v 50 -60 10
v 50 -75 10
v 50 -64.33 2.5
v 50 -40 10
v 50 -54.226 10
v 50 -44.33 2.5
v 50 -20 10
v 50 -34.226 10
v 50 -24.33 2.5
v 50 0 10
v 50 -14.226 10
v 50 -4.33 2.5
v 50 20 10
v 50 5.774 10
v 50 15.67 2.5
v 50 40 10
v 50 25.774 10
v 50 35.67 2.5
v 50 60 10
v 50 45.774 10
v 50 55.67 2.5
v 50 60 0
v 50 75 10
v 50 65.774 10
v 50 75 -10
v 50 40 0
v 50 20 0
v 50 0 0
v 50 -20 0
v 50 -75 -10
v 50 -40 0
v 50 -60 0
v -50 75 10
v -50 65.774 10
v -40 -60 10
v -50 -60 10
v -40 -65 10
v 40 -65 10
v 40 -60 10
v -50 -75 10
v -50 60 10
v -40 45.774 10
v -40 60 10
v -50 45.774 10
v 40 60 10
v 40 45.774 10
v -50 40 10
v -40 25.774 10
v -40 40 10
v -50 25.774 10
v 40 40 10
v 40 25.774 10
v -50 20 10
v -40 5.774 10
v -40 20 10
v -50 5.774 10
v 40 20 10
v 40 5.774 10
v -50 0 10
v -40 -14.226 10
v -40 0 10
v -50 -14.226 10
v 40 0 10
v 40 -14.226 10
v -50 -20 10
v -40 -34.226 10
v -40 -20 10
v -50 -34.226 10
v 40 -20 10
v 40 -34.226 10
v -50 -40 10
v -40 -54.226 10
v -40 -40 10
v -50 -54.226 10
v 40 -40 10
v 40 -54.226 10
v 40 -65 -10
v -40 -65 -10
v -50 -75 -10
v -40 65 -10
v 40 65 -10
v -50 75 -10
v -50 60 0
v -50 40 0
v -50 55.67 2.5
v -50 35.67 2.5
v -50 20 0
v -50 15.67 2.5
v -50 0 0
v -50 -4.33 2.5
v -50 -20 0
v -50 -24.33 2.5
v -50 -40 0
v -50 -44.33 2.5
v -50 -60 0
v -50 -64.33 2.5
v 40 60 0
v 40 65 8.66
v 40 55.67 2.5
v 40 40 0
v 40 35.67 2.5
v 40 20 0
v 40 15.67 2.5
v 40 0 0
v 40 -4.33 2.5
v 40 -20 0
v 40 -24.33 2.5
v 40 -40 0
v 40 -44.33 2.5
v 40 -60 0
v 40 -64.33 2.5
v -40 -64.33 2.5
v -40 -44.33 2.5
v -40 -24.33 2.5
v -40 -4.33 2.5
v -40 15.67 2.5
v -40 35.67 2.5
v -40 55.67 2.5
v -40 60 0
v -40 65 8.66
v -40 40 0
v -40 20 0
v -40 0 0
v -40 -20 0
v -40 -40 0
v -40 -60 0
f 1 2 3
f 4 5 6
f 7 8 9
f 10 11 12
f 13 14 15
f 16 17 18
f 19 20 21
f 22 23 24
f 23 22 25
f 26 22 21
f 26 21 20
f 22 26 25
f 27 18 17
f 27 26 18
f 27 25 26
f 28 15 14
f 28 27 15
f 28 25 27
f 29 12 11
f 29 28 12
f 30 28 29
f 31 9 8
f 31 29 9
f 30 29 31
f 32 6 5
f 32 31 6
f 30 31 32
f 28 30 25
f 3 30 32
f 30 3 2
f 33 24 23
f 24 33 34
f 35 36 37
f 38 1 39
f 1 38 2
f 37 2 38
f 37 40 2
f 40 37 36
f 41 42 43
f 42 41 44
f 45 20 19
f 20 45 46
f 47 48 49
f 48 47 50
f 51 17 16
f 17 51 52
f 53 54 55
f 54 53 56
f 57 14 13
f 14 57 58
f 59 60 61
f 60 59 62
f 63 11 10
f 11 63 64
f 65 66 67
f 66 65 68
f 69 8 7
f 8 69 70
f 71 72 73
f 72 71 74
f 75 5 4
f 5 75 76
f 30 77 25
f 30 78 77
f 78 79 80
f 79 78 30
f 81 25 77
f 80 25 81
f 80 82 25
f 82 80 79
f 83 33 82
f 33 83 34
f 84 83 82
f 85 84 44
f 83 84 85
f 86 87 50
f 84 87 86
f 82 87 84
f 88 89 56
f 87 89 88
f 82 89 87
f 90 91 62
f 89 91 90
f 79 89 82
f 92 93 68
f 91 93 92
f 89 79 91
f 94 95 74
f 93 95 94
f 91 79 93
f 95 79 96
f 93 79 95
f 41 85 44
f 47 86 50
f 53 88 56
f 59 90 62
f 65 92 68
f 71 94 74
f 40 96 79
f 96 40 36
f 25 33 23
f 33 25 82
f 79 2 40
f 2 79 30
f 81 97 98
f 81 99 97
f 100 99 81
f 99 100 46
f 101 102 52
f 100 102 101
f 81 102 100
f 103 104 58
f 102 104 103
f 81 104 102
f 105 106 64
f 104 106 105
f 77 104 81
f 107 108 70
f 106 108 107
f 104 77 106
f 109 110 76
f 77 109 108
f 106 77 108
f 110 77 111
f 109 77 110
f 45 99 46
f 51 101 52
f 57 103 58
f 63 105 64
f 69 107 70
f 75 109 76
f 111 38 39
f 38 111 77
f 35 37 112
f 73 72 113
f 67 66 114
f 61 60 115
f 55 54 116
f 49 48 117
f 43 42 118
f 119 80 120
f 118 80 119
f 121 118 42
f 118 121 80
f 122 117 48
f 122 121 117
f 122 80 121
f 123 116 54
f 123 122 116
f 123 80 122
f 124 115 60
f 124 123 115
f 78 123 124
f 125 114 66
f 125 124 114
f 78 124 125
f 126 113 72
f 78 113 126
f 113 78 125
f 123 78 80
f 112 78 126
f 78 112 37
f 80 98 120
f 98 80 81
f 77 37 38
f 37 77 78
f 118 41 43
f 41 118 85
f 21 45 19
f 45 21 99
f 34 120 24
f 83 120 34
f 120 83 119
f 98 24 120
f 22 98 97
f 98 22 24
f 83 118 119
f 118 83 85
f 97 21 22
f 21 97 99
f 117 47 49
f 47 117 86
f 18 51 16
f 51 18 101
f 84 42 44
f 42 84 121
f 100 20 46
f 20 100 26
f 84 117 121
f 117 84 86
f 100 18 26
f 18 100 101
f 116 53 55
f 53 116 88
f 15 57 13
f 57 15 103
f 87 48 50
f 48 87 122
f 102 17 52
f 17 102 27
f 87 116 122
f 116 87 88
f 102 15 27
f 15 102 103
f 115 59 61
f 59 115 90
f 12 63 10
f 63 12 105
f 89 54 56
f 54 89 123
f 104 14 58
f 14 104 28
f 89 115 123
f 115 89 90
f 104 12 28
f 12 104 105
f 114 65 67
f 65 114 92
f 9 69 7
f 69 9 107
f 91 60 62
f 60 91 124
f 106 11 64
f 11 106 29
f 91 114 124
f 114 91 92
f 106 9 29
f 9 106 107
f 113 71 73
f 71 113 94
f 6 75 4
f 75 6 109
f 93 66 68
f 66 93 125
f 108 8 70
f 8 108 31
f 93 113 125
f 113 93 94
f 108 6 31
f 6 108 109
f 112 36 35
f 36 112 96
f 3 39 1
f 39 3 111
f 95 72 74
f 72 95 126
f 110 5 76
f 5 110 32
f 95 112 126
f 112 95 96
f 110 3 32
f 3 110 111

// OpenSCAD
larghezza=100; //[50:300]
lunghezza =150; //[50:300]
altezza=20; //[10:50]
spessore=20;//[10:50]
numero_tagli=7;//[1:15]
spessore_tagli=5; //[1:10]
inclinazione=60; //[45:90]
distanza_tagli=20;//[12:50]

difference(){
	difference(){
		cube([larghezza,lunghezza,altezza],true);
		cube([(larghezza-spessore),(lunghezza-spessore),(altezza+1)],true);
	}

	for(i = [-((numero_tagli/2)-1):(numero_tagli/2)])
			translate([(-(larghezza/2)-1),((i*(-distanza_tagli))+(distanza_tagli/2)),(0)])
			rotate([inclinazione,0,0])
			cube([larghezza+2,(lunghezza/2),spessore_tagli]);
}
